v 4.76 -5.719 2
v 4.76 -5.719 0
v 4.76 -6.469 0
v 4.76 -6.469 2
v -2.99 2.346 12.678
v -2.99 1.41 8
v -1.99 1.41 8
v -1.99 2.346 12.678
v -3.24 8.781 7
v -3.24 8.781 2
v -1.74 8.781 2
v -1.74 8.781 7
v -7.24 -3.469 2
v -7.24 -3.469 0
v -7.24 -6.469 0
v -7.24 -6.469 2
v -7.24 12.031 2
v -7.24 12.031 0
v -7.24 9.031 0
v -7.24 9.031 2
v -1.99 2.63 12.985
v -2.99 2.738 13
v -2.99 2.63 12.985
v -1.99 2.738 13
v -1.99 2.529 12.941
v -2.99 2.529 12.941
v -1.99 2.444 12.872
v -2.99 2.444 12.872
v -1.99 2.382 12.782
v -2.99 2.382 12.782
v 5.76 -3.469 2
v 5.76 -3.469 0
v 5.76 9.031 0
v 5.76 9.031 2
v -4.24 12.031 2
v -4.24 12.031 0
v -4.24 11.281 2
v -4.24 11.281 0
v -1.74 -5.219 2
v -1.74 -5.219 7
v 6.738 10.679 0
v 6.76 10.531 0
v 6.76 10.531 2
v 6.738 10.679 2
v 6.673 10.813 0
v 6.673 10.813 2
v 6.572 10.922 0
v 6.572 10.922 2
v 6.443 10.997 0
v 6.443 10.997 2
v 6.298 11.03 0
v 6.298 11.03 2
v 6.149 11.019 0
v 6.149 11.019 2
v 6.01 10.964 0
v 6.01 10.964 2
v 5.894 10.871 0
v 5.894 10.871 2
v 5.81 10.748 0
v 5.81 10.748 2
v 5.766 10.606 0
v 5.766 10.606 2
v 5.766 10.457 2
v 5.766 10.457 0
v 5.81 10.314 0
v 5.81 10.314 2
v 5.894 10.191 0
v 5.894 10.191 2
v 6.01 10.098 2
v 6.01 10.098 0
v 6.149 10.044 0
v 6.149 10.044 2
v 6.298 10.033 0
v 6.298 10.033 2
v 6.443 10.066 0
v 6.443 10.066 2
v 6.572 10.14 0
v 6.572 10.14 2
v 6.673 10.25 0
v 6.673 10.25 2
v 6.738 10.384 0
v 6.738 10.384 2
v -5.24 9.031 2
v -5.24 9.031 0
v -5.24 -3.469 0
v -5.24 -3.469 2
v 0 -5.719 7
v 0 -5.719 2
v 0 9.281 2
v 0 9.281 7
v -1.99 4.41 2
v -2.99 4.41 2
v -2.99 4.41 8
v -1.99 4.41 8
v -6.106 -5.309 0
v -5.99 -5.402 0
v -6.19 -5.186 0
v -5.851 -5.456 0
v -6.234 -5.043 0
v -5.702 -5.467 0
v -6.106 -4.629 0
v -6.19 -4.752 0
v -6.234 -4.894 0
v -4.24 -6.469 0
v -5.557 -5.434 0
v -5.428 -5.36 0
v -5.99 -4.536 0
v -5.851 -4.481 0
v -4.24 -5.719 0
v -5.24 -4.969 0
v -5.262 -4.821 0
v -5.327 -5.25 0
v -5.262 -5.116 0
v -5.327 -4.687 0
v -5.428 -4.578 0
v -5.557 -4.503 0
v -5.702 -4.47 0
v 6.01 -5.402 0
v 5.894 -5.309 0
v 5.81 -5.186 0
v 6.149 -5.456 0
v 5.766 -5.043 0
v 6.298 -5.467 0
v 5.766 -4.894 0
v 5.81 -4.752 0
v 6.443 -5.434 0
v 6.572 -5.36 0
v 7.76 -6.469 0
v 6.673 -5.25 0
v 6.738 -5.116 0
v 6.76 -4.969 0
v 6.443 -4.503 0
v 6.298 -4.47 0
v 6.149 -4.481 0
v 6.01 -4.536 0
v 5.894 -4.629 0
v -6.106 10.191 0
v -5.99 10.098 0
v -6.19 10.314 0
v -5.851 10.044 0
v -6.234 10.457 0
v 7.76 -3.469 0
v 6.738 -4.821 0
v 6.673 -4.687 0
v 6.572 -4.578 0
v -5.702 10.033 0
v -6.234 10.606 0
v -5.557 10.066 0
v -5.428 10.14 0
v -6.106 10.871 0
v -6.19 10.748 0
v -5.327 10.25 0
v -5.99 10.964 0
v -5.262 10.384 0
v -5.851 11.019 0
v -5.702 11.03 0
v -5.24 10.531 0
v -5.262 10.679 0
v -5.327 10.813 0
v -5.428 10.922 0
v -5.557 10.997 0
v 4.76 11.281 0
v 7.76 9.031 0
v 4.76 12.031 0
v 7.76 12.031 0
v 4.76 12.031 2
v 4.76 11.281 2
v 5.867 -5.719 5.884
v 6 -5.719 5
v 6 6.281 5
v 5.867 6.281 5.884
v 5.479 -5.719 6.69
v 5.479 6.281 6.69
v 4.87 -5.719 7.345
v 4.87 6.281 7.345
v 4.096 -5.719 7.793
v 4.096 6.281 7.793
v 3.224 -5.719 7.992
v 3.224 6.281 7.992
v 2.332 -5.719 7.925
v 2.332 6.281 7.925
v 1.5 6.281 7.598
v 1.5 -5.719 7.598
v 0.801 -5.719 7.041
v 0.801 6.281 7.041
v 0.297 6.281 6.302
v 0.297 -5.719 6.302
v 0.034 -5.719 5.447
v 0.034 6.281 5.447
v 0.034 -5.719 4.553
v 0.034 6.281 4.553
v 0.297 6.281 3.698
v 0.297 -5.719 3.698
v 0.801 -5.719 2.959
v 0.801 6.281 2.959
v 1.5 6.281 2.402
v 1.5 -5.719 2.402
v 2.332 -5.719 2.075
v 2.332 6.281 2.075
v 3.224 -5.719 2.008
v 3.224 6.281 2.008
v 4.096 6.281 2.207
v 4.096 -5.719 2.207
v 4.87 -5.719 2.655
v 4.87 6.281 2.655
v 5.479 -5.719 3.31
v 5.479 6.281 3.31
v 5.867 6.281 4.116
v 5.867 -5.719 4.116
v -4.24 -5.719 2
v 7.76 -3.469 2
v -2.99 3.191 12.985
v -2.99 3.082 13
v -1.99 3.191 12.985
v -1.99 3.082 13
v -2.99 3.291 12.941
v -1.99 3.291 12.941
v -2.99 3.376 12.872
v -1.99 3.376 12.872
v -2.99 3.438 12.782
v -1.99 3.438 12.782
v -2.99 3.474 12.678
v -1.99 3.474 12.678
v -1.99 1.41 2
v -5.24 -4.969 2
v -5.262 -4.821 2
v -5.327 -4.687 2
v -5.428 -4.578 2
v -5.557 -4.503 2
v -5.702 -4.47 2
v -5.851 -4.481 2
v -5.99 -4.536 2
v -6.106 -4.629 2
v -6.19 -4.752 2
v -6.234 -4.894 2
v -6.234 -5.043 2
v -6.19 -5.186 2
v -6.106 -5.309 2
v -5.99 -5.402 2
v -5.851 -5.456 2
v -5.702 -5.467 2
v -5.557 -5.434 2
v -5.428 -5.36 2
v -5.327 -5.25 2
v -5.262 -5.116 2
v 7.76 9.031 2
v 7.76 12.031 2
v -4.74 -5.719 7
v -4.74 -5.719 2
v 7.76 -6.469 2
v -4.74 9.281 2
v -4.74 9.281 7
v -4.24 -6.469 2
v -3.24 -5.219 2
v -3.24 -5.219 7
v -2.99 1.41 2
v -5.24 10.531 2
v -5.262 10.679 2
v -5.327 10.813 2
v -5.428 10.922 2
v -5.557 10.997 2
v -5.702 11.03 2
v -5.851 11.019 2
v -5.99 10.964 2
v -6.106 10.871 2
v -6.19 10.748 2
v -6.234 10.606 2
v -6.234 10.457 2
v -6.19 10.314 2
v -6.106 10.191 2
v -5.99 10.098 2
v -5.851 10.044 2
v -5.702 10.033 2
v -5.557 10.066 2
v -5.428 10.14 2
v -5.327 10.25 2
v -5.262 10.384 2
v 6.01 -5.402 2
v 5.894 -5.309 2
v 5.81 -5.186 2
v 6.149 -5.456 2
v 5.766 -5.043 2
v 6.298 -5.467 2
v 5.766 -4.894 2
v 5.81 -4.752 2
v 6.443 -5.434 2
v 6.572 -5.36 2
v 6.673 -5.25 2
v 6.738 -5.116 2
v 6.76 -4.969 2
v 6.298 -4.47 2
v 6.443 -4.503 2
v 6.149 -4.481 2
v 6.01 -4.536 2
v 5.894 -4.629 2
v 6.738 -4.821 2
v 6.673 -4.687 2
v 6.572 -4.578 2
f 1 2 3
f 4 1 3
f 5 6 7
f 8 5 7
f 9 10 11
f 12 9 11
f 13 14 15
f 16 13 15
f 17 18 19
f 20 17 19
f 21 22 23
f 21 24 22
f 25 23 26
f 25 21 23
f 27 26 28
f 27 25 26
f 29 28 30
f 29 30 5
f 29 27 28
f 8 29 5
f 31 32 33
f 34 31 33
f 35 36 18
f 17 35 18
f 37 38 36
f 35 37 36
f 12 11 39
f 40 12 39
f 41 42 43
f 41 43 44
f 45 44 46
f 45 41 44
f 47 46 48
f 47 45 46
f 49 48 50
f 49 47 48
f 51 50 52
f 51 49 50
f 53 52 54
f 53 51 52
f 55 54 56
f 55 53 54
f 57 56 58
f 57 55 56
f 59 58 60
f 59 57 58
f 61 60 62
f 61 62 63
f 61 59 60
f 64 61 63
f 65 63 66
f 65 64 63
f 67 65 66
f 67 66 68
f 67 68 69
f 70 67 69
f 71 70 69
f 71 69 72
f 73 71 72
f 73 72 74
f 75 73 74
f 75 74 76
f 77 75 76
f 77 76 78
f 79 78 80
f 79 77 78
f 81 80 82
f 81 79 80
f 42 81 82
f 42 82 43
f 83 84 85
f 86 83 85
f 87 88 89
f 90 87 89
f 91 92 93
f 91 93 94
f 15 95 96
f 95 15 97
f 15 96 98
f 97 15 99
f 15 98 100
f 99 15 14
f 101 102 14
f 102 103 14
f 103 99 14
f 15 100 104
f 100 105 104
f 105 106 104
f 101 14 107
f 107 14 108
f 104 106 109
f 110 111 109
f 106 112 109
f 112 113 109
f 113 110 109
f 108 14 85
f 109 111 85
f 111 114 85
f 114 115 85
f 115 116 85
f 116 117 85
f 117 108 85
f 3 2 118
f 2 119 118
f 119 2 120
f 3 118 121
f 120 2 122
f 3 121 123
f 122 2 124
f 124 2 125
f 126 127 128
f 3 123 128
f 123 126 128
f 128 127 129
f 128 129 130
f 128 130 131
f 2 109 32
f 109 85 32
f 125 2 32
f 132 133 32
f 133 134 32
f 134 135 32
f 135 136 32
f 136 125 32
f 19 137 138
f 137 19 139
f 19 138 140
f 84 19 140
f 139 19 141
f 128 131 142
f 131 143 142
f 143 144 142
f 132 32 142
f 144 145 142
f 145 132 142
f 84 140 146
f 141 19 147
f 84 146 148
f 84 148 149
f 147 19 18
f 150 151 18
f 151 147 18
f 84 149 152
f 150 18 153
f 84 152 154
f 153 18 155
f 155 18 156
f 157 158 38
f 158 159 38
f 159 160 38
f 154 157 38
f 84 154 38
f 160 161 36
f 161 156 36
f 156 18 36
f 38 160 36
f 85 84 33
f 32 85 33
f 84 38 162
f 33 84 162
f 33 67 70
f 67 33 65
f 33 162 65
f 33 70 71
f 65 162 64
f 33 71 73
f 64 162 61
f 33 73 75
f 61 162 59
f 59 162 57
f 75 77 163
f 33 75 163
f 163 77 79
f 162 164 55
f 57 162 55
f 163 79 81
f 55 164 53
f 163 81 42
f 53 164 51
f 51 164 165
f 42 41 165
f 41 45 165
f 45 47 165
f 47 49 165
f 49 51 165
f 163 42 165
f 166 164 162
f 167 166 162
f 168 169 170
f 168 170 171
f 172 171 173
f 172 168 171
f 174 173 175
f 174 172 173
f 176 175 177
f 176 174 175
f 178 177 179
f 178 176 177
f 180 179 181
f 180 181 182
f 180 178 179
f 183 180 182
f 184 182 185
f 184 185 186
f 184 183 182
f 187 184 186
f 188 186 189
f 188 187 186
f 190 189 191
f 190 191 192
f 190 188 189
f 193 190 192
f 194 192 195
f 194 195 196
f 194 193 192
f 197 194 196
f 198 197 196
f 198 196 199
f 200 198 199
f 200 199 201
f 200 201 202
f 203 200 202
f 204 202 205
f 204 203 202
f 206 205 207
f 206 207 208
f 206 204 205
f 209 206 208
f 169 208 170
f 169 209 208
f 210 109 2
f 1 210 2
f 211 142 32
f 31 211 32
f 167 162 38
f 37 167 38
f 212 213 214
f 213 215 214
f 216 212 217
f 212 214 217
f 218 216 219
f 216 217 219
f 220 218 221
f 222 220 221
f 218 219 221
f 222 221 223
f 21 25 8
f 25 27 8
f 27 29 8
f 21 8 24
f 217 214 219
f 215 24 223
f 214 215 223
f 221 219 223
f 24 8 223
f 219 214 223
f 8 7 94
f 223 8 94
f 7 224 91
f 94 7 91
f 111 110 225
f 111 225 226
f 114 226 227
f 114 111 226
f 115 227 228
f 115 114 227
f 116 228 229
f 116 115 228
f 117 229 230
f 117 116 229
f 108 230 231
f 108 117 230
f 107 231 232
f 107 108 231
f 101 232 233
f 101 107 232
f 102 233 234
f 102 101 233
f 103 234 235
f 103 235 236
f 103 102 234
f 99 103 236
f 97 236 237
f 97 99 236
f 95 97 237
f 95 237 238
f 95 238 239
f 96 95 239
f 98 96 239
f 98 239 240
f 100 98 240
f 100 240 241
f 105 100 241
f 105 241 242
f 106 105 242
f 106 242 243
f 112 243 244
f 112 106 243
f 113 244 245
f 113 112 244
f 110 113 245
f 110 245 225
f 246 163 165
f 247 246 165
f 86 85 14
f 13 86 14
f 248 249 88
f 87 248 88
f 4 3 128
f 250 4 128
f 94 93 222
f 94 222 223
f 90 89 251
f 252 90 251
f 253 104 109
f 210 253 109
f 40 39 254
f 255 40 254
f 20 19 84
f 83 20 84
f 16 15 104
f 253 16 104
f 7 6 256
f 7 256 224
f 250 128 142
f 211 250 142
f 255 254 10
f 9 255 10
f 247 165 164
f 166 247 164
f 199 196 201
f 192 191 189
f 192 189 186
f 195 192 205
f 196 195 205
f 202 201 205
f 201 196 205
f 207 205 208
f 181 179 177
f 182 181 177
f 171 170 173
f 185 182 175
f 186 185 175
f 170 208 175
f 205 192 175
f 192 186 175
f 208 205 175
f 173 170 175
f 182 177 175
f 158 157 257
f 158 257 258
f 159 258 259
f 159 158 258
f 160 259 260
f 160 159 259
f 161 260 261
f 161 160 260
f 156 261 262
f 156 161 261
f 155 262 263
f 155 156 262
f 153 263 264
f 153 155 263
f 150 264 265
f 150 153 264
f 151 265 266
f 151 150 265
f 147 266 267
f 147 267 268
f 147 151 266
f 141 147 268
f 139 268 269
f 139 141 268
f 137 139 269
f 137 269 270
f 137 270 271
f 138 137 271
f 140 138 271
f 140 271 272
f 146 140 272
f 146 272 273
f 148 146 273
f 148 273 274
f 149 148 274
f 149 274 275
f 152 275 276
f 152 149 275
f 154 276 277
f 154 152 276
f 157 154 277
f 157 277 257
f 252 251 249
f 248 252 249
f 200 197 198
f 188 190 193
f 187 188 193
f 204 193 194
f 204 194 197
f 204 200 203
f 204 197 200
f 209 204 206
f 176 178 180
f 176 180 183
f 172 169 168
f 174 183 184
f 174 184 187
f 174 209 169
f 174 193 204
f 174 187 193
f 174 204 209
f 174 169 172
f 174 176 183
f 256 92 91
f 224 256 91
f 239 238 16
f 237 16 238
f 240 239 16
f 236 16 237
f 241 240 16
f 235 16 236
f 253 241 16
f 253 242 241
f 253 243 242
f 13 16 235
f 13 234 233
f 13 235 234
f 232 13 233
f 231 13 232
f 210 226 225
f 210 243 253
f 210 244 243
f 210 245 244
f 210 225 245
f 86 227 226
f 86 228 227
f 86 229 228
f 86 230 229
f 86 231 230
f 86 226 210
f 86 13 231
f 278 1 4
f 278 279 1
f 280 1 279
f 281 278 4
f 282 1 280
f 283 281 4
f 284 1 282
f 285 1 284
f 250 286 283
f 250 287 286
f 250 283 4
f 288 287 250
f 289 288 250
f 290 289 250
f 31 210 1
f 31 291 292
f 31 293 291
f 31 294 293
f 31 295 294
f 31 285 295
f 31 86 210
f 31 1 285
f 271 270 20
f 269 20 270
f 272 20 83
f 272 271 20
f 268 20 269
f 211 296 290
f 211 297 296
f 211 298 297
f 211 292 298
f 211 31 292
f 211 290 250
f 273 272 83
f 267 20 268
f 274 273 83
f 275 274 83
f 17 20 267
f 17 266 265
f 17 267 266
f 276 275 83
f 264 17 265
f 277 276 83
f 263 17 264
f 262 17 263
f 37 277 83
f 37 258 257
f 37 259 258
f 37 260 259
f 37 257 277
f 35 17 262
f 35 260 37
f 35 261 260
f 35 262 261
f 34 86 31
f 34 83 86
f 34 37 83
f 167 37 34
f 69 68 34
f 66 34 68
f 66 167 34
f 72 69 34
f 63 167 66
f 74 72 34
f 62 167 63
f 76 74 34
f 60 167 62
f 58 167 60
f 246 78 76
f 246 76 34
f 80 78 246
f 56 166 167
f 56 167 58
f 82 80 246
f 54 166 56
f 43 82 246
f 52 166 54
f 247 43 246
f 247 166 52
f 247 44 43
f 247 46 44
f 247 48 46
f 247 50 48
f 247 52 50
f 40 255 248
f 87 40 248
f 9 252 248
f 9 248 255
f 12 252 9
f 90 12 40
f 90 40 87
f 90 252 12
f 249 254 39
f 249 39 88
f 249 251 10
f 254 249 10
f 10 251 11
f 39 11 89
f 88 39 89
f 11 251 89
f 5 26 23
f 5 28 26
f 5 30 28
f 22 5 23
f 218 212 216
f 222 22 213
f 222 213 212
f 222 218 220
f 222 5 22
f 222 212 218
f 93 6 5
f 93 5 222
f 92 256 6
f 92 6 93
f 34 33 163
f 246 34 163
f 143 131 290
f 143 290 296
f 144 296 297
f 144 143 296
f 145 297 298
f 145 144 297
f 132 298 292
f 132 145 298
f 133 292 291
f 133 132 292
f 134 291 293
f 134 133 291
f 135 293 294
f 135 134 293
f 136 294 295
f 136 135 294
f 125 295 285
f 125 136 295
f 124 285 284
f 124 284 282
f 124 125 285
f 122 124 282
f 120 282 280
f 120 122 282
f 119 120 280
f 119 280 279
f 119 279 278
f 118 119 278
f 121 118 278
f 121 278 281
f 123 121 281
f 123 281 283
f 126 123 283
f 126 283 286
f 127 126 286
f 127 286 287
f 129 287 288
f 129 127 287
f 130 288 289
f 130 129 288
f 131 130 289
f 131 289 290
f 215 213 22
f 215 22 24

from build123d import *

# Parameters (mm, degrees)
F0_R     = 0.5
F0_W     = 1.5
F0_H     = 14
F1_DEPTH = 2
F3_DEPTH = 5
F4_DEPTH = 2
F5_R     = 3
F6_DEPTH = 12
F2_W     = 1
F2_H     = 3
F7_DEPTH = 11
F8_SIZE2 = 5
F8_SIZE  = 1
F9_SIZE2 = 5
F9_SIZE  = 1
F10_R    = 0.4


with BuildPart() as f1:
    # F0 (on Top) → F1 (new body)
    with BuildSketch(Plane.XY):
        Polygon((-4.7396611795, -5.7187644923), (-4.2396611795, -5.7187644923), (-0.2396611795, -5.7187644923), (-0.2396611795, -5.2187644923), (-1.7396611795, -5.2187644923), (-3.2396611795, -5.2187644923), (-4.7396611795, -5.2187644923), align=None)
        Polygon((-4.2396611795, 12.0312355077), (-7.2396611795, 12.0312355077), (-7.2396611795, 9.0312355077), (-5.2396611795, 9.0312355077), (-5.2396611795, -3.4687644923), (-7.2396611795, -3.4687644923), (-7.2396611795, -6.4687644923), (-4.2396611795, -6.4687644923), (-4.2396611795, -5.7187644923), (-4.7396611795, -5.7187644923), (-4.7396611795, -5.2187644923), (-4.7396611795, 9.2812355077), (-0.2396611795, 9.2812355077), (-0.2396611795, -5.2187644923), (-0.2396611795, -5.7187644923), (4.7603388205, -5.7187644923), (4.7603388205, -6.4687644923), (7.7603388205, -6.4687644923), (7.7603388205, -3.4687644923), (5.7603388205, -3.4687644923), (5.7603388205, 9.0312355077), (7.7603388205, 9.0312355077), (7.7603388205, 12.0312355077), (4.7603388205, 12.0312355077), (4.7603388205, 11.2812355077), (-4.2396611795, 11.2812355077), align=None)
        with Locations((-5.7396611795, -4.9687644923)):
            Circle(F0_R, mode=Mode.SUBTRACT)
        with Locations((6.2603388205, -4.9687644923)):
            Circle(F0_R, mode=Mode.SUBTRACT)
        with Locations((-5.7396611795, 10.5312355077)):
            Circle(F0_R, mode=Mode.SUBTRACT)
        with Locations((6.2603388205, 10.5312355077)):
            Circle(F0_R, mode=Mode.SUBTRACT)
        with Locations((-2.4896611795, 1.7812355077)):
            Rectangle(F0_W, F0_H)
    extrude(amount=F1_DEPTH)



with BuildPart() as f3:
    # F2 (on face) → F3 (new body)
    with BuildSketch(Plane.XY.offset(2)):
        Polygon((-0.2396611795, 9.2812355077), (-4.7396611795, 9.2812355077), (-4.7396611795, -5.2187644923), (-3.2396611795, -5.2187644923), (-3.2396611795, 8.7812355077), (-1.7396611795, 8.7812355077), (-1.7396611795, -5.2187644923), (-0.2396611795, -5.2187644923), align=None)
        Polygon((0, 9.2812355077), (-0.2396611795, 9.2812355077), (-0.2396611795, -5.2187644923), (-1.7396611795, -5.2187644923), (-3.2396611795, -5.2187644923), (-4.7396611795, -5.2187644923), (-4.7396611795, -5.7187644923), (-4.2396611795, -5.7187644923), (0, -5.7187644923), align=None)
    extrude(amount=F3_DEPTH)


with BuildPart() as f1_1:
    add(f1.part)
    # F4 (add): a face of the model
    f4_faces = [f3.part.faces().sort_by_distance(p)[0] for p in [
        (-4.5823511709, 1.7812355077, 2),
    ]]
    extrude(f4_faces, amount=F4_DEPTH)


with BuildPart() as f6:
    # F5 (on face) → F6 (new body)
    with BuildSketch(Plane.XZ.offset(5.7187644923)):
        with Locations((3, 5)):
            Circle(F5_R)
    extrude(amount=-F6_DEPTH)


with BuildPart() as f7:
    # F2 (on face) → F7 (new body)
    with BuildSketch(Plane.XY.offset(2)):
        with Locations((-2.4896611795, 2.910102006)):
            Rectangle(F2_W, F2_H)
    extrude(amount=F7_DEPTH)

    # F8
    f8_edges = [f7.edges().sort_by_distance(p)[0] for p in [
        (-2.489661, 1.410102, 13),
    ]]
    f8_side = f7.faces().sort_by_distance((-2.489661, 2.910102, 13))[0]
    chamfer(f8_edges, length=F8_SIZE, length2=F8_SIZE2, reference=f8_side)

    # F9
    f9_edges = [f7.edges().sort_by_distance(p)[0] for p in [
        (-2.489661, 4.410102, 13),
    ]]
    f9_side = f7.faces().sort_by_distance((-2.489661, 3.410102, 13))[0]
    chamfer(f9_edges, length=F9_SIZE, length2=F9_SIZE2, reference=f9_side)

    # F10
    f10_edges = [f7.edges().sort_by_distance(p)[0] for p in [
        (-2.489661, 3.410102, 13),
        (-2.489661, 2.410102, 13),
    ]]
    fillet(f10_edges, radius=F10_R)


solid = Compound([f3.part, f1_1.part, f6.part, f7.part])
